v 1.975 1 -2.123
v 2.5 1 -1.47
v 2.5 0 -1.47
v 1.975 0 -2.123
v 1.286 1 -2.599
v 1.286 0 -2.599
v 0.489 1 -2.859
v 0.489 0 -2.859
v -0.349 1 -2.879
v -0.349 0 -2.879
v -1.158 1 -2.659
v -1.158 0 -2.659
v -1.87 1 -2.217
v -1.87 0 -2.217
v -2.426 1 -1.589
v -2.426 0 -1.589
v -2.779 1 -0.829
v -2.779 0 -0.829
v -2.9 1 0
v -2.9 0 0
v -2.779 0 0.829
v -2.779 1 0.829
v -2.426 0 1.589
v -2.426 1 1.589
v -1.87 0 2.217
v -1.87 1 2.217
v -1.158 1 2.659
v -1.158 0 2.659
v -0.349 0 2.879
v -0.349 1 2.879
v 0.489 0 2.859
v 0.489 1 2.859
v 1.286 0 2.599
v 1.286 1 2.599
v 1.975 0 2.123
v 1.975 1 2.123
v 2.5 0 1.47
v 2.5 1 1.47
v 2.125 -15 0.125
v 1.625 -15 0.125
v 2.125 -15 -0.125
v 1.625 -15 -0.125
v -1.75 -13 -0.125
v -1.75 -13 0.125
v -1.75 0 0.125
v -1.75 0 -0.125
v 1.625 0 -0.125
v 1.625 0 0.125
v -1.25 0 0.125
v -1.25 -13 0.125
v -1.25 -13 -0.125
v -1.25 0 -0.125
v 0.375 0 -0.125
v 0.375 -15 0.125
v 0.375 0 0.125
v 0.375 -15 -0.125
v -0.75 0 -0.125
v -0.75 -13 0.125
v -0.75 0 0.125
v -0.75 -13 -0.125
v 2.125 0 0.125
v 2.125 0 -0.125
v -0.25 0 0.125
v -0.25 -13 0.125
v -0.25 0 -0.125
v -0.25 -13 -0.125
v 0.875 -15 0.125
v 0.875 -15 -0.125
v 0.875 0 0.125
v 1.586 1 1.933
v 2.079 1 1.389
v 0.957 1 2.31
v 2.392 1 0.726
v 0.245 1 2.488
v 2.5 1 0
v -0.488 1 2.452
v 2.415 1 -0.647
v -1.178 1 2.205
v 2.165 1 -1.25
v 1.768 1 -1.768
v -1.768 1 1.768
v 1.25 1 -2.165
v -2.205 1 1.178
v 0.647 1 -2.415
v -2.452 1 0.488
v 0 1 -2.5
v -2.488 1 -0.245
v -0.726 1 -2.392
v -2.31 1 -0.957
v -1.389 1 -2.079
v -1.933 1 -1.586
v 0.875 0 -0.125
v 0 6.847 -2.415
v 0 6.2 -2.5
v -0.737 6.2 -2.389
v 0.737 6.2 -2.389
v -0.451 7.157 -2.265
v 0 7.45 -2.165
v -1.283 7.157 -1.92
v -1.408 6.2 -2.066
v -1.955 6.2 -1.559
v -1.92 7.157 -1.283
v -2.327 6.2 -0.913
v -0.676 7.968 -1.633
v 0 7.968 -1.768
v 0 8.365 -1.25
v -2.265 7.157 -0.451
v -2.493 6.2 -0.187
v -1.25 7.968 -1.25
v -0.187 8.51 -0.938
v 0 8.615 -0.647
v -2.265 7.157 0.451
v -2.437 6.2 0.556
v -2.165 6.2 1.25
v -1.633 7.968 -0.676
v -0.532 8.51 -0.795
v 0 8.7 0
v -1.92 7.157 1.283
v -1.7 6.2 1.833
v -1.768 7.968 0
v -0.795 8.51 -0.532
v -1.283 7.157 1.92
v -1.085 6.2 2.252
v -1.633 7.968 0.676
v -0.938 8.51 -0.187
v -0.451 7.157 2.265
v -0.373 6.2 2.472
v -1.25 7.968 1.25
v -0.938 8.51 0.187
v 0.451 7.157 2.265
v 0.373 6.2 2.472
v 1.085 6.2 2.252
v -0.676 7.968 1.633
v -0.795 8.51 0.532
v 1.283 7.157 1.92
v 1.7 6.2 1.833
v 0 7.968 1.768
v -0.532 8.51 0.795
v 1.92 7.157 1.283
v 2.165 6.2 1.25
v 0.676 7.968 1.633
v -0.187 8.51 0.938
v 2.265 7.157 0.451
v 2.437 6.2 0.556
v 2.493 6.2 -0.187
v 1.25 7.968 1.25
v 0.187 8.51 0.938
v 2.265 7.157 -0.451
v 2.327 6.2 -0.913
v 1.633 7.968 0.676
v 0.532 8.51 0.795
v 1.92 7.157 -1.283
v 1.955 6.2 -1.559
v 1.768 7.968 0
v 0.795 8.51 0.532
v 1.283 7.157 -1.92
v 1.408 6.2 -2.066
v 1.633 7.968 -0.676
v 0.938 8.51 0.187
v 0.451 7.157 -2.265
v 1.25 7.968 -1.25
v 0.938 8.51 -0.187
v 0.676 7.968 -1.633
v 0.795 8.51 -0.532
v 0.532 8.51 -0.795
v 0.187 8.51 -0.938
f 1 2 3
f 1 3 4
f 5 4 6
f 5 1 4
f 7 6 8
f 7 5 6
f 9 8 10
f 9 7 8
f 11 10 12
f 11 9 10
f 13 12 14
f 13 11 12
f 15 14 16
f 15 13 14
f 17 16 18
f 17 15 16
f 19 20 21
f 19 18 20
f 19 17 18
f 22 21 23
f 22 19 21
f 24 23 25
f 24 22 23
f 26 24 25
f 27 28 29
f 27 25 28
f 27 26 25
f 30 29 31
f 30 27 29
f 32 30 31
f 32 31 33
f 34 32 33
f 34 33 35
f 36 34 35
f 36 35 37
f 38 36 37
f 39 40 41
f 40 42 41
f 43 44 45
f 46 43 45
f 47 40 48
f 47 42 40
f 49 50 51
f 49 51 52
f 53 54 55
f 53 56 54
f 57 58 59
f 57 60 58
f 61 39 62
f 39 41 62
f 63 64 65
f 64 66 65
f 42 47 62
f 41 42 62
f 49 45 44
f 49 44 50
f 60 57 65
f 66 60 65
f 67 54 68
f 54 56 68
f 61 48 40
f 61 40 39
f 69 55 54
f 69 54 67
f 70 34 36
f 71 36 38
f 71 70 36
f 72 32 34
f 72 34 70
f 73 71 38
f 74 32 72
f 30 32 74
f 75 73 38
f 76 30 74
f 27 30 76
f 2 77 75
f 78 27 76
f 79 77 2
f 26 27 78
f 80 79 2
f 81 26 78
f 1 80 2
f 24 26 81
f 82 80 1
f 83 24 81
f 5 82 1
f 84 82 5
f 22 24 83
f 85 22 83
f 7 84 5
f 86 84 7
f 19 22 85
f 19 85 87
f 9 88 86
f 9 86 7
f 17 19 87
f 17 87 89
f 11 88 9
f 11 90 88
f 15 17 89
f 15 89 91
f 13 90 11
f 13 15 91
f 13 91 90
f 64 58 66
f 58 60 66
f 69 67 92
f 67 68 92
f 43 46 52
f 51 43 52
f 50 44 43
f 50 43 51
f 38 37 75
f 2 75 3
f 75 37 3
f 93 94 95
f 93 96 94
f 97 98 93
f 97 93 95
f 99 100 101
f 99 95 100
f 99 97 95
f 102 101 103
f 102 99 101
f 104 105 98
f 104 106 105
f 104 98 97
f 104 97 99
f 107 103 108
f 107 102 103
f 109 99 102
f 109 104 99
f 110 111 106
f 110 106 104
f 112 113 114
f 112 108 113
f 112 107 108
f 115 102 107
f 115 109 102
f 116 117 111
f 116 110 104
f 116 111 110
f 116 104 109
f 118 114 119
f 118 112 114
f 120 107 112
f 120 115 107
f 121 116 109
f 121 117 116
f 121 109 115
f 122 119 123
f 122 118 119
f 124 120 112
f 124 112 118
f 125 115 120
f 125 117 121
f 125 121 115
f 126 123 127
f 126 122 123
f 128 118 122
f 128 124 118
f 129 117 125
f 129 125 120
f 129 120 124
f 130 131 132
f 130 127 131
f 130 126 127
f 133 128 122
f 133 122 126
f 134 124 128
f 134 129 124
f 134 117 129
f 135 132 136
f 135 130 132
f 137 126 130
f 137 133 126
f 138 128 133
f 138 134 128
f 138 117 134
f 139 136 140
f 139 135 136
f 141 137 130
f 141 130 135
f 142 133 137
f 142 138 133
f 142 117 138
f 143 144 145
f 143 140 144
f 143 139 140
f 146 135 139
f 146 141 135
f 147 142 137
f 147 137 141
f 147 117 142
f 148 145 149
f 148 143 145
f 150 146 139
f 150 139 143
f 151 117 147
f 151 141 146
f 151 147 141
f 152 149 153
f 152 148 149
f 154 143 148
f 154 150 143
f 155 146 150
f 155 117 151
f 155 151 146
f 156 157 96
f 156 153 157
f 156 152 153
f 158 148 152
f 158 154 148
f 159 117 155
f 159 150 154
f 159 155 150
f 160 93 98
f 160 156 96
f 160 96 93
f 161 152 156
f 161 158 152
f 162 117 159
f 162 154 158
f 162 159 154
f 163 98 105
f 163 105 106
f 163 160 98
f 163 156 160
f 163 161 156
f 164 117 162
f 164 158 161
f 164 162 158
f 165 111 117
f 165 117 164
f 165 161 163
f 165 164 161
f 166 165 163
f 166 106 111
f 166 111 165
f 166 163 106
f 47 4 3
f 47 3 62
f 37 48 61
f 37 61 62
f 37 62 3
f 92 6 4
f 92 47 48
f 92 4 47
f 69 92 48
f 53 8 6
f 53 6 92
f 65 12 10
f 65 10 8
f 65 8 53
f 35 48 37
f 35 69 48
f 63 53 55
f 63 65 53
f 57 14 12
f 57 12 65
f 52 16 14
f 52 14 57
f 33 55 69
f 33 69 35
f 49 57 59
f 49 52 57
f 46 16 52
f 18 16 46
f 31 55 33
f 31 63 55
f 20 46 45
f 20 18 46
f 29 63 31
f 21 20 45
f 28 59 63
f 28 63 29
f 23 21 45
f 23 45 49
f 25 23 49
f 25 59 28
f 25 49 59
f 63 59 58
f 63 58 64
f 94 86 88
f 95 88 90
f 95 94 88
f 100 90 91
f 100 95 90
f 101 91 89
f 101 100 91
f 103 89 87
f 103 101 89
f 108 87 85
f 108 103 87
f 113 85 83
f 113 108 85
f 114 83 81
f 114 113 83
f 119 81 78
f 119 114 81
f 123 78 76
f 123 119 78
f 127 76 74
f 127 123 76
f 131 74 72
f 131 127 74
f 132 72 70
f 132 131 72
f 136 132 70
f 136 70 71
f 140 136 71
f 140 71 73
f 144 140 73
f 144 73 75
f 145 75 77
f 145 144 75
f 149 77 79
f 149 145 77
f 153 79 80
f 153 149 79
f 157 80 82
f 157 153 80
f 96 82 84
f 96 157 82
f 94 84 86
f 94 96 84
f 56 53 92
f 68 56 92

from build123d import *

# Parameters (mm, degrees)
SKETCH2_W           = 0.4
SKETCH2_H           = 2.939387692
CUT_EXTRUDE1_DEPTH  = 10.618211892
SKETCH3_W           = 0.5
SKETCH3_H           = 15
SKETCH3_H_2         = 13
BOSS_EXTRUDE1_DEPTH = 0.125


with BuildPart() as part:
    # Sketch1 → Revolve1 (revolve)
    with BuildSketch(Plane(origin=(0, 0, 0), x_dir=(0, 0, -1), z_dir=(1, 0, 0))):
        with BuildLine():
            Line((0, 0), (2.9, 0))
            Line((2.9, 0), (2.9, 1))
            Line((2.9, 1), (2.5, 1))
            Line((2.5, 1), (2.5, 6.2))
            ThreePointArc((2.5, 6.2), (1.767766953, 7.967766953), (0, 8.7))
            Line((0, 8.7), (0, 0))
        make_face()
    revolve(axis=Axis((0, 0, 0), (0, 1, 0)))

    # Sketch2 → Cut-Extrude1 (cut, through all)
    with BuildSketch(Plane(origin=(0, 0, 0), x_dir=(1, 0, 0), z_dir=(0, 1, 0))):
        with Locations((2.7, 0)):
            Rectangle(SKETCH2_W, SKETCH2_H)
    extrude(amount=CUT_EXTRUDE1_DEPTH, mode=Mode.SUBTRACT)

    # Sketch3 → Boss-Extrude1 (add, symmetric)
    with BuildSketch(Plane.XY):
        with Locations((0.625, -7.5)):
            Rectangle(SKETCH3_W, SKETCH3_H)
        with Locations((1.875, -7.5)):
            Rectangle(SKETCH3_W, SKETCH3_H)
        with Locations((-0.5, -6.5)):
            Rectangle(SKETCH3_W, SKETCH3_H_2)
        with Locations((-1.5, -6.5)):
            Rectangle(SKETCH3_W, SKETCH3_H_2)
    extrude(amount=BOSS_EXTRUDE1_DEPTH, both=True)


solid = part.part
